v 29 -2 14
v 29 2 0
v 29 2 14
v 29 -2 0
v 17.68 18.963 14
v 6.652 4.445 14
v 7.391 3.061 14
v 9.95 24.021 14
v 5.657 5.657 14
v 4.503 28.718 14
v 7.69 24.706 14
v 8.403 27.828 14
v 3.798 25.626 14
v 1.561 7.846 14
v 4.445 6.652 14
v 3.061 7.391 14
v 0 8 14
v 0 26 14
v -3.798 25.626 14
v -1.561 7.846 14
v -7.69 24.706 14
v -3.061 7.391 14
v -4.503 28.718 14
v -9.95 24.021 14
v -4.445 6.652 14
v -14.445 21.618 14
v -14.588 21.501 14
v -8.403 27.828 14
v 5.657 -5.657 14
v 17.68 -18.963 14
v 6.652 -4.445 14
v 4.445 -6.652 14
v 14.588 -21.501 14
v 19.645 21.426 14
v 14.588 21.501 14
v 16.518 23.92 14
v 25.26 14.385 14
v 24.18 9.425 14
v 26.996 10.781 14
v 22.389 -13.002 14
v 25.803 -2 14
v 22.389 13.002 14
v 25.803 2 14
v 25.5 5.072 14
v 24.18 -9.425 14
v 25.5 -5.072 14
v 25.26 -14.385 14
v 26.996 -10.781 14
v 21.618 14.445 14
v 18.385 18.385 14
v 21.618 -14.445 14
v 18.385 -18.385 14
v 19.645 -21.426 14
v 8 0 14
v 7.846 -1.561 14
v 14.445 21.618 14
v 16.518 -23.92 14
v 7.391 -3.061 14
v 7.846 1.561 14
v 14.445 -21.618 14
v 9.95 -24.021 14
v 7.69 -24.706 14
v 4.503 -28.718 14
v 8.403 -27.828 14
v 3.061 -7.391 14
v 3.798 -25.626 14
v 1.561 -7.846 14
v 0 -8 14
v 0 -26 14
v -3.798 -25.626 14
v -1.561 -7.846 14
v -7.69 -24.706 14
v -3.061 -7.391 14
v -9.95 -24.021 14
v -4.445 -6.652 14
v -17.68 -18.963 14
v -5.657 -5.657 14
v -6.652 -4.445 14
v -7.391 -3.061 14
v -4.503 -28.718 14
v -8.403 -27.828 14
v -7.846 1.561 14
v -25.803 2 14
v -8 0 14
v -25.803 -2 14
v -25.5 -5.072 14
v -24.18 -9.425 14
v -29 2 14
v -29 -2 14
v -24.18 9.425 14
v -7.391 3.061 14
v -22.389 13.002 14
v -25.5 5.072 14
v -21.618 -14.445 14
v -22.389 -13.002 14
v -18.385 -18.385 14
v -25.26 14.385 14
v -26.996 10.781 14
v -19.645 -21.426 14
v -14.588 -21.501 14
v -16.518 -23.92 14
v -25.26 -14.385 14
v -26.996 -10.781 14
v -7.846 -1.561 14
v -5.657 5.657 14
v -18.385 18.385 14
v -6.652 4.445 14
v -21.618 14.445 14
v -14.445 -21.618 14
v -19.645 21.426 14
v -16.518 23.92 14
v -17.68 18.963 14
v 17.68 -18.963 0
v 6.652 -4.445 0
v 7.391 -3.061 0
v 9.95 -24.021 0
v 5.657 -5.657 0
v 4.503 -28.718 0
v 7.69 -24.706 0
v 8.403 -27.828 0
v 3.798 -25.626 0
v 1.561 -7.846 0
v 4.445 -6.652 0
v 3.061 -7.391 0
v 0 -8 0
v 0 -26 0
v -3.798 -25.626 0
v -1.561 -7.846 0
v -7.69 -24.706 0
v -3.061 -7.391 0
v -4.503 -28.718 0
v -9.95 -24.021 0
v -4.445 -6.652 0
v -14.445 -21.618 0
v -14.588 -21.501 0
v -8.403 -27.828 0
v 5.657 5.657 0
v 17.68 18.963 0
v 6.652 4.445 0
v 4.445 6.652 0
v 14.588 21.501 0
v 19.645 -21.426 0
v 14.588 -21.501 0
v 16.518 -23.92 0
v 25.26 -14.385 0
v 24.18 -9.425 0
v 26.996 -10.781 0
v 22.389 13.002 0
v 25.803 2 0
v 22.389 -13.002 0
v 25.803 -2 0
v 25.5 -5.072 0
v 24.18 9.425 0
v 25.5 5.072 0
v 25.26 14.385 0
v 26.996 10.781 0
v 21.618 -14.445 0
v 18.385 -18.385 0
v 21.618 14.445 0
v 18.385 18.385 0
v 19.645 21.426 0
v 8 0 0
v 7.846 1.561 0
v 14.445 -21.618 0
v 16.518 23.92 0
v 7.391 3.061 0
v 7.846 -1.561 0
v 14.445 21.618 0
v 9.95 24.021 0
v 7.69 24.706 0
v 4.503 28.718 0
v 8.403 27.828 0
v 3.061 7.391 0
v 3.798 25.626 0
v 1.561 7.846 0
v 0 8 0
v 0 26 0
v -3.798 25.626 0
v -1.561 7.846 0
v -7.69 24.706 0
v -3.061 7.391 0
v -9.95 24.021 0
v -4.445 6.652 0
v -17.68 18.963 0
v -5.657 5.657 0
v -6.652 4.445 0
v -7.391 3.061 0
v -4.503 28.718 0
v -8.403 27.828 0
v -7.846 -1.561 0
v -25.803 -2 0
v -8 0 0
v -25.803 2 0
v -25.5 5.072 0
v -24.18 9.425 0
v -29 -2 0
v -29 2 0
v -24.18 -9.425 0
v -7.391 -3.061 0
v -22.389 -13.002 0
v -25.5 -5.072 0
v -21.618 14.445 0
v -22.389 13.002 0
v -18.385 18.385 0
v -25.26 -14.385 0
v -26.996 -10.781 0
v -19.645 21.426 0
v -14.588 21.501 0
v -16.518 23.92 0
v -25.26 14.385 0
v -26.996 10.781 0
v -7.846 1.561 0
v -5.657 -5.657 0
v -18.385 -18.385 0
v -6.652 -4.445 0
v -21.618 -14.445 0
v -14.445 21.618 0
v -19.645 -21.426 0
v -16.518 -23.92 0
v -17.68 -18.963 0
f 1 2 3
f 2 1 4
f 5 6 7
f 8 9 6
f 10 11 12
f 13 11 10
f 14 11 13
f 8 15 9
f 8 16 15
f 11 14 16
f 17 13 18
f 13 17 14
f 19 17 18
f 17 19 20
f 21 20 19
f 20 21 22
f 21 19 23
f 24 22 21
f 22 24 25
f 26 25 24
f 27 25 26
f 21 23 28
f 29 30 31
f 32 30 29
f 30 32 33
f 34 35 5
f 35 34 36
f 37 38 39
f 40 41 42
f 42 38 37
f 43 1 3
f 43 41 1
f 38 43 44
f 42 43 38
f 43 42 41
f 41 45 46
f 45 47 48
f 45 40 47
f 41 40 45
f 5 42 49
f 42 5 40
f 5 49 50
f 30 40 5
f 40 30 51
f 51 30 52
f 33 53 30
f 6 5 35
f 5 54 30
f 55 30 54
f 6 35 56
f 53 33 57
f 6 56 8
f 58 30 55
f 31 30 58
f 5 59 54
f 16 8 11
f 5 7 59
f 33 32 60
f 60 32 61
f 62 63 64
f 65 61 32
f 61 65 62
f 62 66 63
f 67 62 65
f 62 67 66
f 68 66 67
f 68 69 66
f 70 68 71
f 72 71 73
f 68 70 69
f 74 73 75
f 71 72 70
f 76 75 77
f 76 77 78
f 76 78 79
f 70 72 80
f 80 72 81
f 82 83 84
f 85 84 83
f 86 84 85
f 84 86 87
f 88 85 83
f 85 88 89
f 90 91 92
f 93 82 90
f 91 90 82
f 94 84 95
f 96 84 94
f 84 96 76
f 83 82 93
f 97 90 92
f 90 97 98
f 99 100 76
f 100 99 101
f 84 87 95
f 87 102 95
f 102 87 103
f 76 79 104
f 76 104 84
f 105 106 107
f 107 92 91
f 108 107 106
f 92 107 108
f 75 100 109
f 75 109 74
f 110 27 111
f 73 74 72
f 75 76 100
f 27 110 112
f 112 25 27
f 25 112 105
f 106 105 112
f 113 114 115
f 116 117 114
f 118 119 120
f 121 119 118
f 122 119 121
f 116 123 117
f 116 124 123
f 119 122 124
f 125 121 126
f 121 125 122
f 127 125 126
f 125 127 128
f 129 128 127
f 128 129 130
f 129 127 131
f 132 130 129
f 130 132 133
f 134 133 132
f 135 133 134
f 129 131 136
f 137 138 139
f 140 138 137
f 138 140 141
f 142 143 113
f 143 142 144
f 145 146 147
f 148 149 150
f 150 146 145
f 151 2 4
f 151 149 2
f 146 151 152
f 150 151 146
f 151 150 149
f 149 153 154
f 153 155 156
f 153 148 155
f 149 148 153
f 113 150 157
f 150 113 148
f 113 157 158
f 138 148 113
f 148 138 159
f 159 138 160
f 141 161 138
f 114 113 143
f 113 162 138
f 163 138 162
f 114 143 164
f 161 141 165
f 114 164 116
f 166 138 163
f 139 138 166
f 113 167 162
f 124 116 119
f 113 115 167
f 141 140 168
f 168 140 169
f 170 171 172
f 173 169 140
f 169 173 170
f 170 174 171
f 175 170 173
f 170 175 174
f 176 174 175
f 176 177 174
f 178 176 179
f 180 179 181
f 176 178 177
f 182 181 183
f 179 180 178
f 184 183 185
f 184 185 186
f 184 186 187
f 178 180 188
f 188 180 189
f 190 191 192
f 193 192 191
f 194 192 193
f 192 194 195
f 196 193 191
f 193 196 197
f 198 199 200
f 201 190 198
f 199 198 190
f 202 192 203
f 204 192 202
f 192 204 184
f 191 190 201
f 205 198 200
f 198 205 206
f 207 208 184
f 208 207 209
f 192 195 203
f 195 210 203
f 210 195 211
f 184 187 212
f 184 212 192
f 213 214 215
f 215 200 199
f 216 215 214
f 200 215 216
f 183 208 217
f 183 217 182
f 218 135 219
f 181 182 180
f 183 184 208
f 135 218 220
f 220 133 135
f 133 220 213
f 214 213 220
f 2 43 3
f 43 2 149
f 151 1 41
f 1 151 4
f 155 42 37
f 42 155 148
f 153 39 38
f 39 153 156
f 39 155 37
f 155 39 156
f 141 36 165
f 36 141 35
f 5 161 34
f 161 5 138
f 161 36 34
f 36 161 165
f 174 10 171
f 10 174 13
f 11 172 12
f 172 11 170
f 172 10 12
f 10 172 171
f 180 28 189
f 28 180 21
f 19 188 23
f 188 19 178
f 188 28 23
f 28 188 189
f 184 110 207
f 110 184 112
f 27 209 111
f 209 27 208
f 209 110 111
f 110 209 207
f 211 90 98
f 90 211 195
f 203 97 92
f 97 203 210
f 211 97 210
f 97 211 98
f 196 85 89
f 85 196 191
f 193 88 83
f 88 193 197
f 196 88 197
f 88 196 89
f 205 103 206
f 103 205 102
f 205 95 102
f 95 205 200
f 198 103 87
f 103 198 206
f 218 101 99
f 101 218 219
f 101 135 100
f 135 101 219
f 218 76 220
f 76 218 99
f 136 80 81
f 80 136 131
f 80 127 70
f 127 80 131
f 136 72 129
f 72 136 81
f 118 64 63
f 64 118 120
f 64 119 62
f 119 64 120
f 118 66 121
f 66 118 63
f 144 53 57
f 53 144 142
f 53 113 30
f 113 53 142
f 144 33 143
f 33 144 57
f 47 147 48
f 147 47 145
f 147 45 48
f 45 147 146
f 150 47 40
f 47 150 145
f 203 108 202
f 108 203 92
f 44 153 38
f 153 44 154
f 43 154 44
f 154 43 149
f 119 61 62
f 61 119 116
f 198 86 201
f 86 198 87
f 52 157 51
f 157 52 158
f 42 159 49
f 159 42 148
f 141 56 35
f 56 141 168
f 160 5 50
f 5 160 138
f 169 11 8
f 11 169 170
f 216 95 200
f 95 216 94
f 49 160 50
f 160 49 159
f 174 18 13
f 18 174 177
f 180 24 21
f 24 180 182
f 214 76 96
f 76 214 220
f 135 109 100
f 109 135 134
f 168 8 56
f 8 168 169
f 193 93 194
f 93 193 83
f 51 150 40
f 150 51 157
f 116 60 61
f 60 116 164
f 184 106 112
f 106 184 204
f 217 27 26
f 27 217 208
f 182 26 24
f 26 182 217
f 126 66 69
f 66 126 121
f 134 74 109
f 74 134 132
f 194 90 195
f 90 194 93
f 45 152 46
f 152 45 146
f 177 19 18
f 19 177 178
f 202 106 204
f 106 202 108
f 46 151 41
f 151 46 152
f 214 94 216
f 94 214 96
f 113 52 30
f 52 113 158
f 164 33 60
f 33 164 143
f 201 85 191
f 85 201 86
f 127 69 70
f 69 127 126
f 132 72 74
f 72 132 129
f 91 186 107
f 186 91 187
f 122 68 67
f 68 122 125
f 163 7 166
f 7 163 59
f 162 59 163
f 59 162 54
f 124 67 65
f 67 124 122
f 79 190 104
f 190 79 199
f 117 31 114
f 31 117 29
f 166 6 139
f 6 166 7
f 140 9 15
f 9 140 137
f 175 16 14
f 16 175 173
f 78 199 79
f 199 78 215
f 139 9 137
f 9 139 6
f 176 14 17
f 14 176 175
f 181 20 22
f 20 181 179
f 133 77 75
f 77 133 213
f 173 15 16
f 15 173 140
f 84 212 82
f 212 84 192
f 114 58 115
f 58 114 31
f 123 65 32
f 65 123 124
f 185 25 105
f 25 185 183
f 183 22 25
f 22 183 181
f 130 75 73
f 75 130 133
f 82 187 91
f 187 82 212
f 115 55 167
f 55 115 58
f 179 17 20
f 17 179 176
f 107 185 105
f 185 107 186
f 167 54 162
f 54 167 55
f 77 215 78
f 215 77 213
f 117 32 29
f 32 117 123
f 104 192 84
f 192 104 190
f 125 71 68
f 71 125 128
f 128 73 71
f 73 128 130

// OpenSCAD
$fn = 32;

// ----------------------------------------------------------------------
// Spur blank: bored gear blank
// ----------------------------------------------------------------------

// --- parameters (mm) ---
disc_r = 26;              // blank root radius
disc_t = 14;              // blank thickness
n_teeth = 14;             // stub tooth count
tooth_w = 4;              // tooth width at the root
tooth_h = 3;              // tooth height above the root
bore_r = 8;               // central bore radius

out_r = disc_r + tooth_h;  // tip radius
bbox_x = 58.0;  // measured width over the teeth
bbox_y = 57.44;  // measured depth over the teeth

difference() {
union() {
  cylinder(r = disc_r, h = disc_t);
  for (i = [0 : n_teeth - 1])
    rotate([0, 0, i * 360 / n_teeth])
      translate([disc_r - 1, -tooth_w / 2, 0])
        cube([tooth_h + 1, tooth_w, disc_t]);
}
  translate([0, 0, -1]) cylinder(r = bore_r, h = disc_t + 2);
}
